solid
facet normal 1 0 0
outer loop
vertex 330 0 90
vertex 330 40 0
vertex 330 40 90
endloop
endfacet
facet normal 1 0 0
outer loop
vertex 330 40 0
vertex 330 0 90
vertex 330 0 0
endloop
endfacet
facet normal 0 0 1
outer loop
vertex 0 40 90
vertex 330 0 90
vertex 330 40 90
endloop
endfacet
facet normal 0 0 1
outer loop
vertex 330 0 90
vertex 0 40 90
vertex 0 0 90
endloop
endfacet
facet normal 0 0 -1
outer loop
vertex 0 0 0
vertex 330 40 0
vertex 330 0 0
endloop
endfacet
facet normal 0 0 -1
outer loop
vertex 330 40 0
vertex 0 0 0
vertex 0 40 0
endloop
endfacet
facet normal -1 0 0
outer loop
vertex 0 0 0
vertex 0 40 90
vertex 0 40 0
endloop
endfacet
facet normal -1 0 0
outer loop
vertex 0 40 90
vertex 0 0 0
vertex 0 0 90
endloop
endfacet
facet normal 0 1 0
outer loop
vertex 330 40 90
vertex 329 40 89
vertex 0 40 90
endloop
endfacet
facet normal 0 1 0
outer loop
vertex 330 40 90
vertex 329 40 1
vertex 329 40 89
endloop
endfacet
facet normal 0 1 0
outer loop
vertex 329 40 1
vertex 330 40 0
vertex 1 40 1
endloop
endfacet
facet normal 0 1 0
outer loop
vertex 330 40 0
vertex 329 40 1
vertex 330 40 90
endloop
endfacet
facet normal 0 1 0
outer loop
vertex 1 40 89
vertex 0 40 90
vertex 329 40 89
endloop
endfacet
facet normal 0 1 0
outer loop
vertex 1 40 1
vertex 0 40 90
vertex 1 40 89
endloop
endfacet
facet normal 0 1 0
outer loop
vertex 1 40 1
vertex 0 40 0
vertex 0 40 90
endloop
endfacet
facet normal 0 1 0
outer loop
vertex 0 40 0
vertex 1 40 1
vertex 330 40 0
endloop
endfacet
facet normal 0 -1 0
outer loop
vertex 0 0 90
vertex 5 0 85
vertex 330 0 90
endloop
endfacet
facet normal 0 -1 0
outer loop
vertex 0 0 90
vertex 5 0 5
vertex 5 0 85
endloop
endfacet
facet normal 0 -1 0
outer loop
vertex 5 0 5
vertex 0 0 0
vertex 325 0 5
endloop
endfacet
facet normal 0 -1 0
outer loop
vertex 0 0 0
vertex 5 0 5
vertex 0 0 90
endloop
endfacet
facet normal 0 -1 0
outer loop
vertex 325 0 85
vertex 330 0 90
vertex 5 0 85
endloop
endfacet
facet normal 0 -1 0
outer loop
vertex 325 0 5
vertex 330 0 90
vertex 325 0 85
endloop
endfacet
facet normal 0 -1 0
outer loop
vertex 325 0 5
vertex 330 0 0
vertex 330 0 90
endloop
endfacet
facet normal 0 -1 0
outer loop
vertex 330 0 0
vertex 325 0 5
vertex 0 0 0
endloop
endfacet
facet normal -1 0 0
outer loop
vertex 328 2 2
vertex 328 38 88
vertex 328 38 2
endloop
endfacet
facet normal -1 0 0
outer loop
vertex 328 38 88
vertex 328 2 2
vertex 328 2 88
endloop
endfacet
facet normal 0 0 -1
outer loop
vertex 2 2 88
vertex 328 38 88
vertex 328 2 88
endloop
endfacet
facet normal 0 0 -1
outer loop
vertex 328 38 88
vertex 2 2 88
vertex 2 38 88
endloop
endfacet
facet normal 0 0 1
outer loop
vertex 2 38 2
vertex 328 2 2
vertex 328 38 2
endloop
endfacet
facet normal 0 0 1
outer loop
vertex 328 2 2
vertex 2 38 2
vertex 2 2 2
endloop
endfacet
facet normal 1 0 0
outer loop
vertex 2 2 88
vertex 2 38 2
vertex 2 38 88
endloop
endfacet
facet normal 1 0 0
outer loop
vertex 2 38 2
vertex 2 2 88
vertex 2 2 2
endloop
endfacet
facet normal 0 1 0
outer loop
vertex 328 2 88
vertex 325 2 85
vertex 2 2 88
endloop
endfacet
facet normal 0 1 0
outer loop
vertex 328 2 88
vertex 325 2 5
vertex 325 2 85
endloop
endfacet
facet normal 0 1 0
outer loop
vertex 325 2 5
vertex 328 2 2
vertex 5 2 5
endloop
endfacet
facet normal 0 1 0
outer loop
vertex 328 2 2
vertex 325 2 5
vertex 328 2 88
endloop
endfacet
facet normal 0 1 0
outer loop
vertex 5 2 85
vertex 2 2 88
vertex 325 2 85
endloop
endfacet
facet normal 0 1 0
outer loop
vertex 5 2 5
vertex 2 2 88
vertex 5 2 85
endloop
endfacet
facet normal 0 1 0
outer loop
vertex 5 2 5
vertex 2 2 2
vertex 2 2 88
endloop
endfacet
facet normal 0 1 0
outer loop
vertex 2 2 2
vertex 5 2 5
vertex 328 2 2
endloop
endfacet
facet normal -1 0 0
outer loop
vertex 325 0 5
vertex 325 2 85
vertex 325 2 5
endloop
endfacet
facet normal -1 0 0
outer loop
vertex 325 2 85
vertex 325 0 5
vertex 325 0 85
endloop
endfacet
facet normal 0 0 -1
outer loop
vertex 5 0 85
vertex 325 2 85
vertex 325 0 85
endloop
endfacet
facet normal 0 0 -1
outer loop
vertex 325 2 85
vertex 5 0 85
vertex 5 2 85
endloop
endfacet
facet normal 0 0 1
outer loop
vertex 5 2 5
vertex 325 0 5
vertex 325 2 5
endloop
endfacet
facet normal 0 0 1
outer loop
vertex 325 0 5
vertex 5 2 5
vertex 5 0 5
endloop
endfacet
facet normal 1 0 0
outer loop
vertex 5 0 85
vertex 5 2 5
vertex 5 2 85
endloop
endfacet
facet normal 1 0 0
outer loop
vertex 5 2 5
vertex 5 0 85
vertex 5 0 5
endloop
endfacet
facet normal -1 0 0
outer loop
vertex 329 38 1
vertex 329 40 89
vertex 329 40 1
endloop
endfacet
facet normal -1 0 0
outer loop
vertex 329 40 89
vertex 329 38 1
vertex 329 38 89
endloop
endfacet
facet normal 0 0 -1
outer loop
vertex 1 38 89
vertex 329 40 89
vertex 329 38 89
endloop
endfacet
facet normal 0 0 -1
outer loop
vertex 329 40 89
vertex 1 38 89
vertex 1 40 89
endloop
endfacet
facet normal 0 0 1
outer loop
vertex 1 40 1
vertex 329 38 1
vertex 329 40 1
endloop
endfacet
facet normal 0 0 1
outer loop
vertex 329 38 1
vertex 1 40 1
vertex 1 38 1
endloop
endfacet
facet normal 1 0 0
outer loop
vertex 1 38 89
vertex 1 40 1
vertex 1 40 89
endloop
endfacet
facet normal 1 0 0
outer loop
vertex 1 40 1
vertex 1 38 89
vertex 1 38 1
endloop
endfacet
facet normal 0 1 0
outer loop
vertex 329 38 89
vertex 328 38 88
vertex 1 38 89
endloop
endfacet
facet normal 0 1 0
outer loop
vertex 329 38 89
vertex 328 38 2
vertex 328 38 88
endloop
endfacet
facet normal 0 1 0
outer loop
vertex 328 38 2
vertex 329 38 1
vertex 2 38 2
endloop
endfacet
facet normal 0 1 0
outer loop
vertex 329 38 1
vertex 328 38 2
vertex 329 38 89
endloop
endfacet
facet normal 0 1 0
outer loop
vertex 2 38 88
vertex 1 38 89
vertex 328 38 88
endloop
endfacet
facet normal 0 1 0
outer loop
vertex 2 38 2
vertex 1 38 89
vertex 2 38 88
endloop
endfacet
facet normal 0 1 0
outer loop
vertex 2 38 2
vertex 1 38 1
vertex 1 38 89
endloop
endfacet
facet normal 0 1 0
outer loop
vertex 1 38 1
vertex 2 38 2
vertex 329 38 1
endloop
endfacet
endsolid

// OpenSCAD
$fn = 20;

width = 330;
height = 90;
depth = 40;

border = 2;
matrice_border = 5;

difference() {
	cube([width, depth, height]);
	// empty cube inside
	translate([border, border, border])
		cube([width - border * 2, depth - border, height - border * 2]);
	// border for the matrice
	translate([matrice_border, 0, matrice_border])
		cube([width - matrice_border * 2, depth, height - matrice_border * 2]);
	// gap at the bottom
	translate([border / 2, depth - border, border / 2])
		cube([width - border, depth, height - border]);
}
